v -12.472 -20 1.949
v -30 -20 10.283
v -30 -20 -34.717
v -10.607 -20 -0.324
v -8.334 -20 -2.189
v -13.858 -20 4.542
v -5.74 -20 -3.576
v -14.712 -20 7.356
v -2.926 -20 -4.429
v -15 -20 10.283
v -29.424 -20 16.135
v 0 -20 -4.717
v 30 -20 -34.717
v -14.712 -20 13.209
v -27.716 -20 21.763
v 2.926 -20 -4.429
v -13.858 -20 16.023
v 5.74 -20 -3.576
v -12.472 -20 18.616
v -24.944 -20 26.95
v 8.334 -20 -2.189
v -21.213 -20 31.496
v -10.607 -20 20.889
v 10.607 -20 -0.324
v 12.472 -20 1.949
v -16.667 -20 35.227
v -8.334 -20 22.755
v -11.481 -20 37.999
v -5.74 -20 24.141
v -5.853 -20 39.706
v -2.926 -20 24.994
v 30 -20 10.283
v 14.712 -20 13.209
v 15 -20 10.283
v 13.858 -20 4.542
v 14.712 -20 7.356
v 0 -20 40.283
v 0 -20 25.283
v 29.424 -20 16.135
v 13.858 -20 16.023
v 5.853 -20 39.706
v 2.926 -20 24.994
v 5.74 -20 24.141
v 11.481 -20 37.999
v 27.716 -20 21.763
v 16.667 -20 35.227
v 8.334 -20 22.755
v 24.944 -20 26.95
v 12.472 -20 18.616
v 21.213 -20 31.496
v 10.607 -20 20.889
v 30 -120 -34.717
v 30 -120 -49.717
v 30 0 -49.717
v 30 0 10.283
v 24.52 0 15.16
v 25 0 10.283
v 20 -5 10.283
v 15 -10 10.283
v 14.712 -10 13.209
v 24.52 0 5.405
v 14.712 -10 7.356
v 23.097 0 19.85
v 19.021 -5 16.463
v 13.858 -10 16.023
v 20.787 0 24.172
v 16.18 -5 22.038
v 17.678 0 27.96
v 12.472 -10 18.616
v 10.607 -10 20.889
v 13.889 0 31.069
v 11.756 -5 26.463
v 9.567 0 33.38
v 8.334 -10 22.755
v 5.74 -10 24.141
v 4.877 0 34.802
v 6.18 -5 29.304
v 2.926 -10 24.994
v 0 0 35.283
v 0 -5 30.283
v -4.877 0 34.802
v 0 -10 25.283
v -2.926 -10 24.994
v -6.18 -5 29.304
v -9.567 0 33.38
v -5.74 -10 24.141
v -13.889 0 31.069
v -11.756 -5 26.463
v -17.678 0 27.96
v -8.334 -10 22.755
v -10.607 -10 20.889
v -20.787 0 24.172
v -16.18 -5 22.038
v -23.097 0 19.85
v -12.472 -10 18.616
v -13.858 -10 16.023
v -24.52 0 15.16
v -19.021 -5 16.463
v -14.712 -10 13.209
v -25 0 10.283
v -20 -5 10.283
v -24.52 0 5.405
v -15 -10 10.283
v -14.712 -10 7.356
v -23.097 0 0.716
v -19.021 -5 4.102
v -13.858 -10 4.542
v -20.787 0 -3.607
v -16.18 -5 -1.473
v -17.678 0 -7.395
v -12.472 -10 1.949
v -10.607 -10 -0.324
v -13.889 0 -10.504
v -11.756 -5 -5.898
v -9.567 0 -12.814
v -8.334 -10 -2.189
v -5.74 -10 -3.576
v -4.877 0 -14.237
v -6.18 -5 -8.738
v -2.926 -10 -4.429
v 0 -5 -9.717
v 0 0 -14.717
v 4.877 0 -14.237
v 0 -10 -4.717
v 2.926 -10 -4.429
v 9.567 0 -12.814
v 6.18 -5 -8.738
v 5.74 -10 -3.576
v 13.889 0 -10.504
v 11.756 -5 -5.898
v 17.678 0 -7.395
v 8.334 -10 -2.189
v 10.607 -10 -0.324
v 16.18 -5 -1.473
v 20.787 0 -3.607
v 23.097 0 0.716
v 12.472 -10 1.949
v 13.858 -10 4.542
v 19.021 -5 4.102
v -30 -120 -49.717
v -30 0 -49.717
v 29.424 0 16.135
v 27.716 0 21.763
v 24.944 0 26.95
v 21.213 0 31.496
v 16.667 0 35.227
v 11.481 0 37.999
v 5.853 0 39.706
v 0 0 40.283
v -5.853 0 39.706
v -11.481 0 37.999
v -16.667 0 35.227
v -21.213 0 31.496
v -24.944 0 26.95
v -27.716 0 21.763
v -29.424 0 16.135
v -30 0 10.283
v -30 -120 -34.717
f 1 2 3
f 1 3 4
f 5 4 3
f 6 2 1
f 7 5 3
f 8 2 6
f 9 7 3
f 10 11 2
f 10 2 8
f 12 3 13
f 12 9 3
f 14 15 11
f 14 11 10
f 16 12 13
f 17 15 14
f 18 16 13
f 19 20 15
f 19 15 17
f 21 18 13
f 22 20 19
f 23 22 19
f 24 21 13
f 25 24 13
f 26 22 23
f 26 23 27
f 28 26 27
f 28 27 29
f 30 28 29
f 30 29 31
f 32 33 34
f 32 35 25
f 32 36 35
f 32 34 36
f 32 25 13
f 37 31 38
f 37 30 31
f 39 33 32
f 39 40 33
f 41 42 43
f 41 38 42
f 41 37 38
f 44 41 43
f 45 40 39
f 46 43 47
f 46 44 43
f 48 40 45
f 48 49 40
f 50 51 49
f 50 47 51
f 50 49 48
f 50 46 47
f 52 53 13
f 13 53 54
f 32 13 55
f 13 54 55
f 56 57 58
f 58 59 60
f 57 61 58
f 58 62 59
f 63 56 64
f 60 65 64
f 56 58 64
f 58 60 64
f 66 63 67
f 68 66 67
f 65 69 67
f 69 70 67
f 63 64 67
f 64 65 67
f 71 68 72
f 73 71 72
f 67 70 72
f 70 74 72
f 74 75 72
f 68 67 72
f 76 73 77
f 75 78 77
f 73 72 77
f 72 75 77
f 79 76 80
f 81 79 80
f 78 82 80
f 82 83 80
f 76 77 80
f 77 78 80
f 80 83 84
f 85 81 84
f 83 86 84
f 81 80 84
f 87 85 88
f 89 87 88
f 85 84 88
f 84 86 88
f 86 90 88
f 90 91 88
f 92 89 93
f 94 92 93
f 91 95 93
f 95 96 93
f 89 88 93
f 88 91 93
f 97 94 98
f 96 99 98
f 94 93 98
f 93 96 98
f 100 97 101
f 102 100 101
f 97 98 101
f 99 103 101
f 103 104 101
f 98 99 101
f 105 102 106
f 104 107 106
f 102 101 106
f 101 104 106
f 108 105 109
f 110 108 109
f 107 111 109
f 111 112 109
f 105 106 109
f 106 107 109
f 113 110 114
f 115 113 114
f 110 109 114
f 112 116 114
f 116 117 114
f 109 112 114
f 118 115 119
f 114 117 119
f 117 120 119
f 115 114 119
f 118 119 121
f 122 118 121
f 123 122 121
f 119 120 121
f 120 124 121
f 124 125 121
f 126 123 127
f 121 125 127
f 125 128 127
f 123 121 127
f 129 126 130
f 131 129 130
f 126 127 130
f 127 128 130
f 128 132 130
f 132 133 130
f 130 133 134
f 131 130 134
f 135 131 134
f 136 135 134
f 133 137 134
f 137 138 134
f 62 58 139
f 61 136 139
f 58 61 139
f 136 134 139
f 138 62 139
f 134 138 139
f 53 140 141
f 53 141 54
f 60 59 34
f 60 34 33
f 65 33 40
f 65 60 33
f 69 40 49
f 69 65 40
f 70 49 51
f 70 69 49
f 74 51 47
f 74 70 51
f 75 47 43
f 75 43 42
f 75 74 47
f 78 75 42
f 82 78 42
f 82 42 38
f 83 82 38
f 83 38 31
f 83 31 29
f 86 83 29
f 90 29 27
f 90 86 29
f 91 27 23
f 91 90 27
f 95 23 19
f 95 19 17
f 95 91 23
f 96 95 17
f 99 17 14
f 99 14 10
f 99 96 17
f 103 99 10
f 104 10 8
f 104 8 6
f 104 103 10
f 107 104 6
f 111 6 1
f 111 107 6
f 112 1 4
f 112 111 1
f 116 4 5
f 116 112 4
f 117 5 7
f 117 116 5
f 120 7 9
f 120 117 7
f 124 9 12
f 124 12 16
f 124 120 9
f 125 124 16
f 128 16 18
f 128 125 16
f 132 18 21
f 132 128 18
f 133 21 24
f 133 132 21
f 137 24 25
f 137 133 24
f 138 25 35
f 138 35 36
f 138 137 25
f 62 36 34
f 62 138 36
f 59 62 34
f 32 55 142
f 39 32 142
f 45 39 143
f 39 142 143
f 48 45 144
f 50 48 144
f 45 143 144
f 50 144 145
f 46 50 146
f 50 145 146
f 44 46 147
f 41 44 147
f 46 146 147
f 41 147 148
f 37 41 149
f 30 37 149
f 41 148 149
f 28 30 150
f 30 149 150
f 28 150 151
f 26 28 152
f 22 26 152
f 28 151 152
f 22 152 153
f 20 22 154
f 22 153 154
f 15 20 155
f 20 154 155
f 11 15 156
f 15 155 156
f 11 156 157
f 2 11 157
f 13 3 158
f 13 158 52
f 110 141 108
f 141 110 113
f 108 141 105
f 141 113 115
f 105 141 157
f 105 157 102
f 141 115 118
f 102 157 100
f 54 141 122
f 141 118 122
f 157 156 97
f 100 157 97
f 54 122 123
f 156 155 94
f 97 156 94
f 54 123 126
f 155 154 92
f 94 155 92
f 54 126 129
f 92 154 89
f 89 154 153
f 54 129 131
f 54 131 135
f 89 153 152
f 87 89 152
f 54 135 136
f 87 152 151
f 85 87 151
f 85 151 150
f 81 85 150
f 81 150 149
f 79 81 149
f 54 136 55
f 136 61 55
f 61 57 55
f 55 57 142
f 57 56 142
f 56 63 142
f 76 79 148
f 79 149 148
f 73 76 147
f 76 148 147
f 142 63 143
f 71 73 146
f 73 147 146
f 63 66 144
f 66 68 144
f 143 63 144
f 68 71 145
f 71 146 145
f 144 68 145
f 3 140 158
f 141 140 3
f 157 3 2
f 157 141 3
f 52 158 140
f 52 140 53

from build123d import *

# Parameters (mm, degrees)
F0_R     = 15
F1_DEPTH = 20
F2_W     = 60
F2_H     = 15
F3_DEPTH = 100
F4_SIZE  = 10


with BuildPart() as f1:
    # F0 (on Front) → F1 (new body)
    with BuildSketch(Plane.XZ):
        with BuildLine():
            Line((-30, -49.717317), (30, -49.717317))
            Line((30, -49.717317), (30, 10.282683))
            ThreePointArc((30, 10.282683), (0, 40.282683), (-30, 10.282683))
            Line((-30, 10.282683), (-30, -49.717317))
        make_face()
        with Locations((0, 10.282683)):
            Circle(F0_R, mode=Mode.SUBTRACT)
    extrude(amount=F1_DEPTH)

    # F2 (on face) → F3 (join)
    with BuildSketch(Plane.XZ.offset(20)):
        with Locations((0, -42.217317)):
            Rectangle(F2_W, F2_H)
    extrude(amount=F3_DEPTH)

    # F4
    f4_edges = [f1.edges().sort_by_distance(p)[0] for p in [
        (-15, 0, 10.282683),
    ]]
    chamfer(f4_edges, length=F4_SIZE)


solid = f1.part
